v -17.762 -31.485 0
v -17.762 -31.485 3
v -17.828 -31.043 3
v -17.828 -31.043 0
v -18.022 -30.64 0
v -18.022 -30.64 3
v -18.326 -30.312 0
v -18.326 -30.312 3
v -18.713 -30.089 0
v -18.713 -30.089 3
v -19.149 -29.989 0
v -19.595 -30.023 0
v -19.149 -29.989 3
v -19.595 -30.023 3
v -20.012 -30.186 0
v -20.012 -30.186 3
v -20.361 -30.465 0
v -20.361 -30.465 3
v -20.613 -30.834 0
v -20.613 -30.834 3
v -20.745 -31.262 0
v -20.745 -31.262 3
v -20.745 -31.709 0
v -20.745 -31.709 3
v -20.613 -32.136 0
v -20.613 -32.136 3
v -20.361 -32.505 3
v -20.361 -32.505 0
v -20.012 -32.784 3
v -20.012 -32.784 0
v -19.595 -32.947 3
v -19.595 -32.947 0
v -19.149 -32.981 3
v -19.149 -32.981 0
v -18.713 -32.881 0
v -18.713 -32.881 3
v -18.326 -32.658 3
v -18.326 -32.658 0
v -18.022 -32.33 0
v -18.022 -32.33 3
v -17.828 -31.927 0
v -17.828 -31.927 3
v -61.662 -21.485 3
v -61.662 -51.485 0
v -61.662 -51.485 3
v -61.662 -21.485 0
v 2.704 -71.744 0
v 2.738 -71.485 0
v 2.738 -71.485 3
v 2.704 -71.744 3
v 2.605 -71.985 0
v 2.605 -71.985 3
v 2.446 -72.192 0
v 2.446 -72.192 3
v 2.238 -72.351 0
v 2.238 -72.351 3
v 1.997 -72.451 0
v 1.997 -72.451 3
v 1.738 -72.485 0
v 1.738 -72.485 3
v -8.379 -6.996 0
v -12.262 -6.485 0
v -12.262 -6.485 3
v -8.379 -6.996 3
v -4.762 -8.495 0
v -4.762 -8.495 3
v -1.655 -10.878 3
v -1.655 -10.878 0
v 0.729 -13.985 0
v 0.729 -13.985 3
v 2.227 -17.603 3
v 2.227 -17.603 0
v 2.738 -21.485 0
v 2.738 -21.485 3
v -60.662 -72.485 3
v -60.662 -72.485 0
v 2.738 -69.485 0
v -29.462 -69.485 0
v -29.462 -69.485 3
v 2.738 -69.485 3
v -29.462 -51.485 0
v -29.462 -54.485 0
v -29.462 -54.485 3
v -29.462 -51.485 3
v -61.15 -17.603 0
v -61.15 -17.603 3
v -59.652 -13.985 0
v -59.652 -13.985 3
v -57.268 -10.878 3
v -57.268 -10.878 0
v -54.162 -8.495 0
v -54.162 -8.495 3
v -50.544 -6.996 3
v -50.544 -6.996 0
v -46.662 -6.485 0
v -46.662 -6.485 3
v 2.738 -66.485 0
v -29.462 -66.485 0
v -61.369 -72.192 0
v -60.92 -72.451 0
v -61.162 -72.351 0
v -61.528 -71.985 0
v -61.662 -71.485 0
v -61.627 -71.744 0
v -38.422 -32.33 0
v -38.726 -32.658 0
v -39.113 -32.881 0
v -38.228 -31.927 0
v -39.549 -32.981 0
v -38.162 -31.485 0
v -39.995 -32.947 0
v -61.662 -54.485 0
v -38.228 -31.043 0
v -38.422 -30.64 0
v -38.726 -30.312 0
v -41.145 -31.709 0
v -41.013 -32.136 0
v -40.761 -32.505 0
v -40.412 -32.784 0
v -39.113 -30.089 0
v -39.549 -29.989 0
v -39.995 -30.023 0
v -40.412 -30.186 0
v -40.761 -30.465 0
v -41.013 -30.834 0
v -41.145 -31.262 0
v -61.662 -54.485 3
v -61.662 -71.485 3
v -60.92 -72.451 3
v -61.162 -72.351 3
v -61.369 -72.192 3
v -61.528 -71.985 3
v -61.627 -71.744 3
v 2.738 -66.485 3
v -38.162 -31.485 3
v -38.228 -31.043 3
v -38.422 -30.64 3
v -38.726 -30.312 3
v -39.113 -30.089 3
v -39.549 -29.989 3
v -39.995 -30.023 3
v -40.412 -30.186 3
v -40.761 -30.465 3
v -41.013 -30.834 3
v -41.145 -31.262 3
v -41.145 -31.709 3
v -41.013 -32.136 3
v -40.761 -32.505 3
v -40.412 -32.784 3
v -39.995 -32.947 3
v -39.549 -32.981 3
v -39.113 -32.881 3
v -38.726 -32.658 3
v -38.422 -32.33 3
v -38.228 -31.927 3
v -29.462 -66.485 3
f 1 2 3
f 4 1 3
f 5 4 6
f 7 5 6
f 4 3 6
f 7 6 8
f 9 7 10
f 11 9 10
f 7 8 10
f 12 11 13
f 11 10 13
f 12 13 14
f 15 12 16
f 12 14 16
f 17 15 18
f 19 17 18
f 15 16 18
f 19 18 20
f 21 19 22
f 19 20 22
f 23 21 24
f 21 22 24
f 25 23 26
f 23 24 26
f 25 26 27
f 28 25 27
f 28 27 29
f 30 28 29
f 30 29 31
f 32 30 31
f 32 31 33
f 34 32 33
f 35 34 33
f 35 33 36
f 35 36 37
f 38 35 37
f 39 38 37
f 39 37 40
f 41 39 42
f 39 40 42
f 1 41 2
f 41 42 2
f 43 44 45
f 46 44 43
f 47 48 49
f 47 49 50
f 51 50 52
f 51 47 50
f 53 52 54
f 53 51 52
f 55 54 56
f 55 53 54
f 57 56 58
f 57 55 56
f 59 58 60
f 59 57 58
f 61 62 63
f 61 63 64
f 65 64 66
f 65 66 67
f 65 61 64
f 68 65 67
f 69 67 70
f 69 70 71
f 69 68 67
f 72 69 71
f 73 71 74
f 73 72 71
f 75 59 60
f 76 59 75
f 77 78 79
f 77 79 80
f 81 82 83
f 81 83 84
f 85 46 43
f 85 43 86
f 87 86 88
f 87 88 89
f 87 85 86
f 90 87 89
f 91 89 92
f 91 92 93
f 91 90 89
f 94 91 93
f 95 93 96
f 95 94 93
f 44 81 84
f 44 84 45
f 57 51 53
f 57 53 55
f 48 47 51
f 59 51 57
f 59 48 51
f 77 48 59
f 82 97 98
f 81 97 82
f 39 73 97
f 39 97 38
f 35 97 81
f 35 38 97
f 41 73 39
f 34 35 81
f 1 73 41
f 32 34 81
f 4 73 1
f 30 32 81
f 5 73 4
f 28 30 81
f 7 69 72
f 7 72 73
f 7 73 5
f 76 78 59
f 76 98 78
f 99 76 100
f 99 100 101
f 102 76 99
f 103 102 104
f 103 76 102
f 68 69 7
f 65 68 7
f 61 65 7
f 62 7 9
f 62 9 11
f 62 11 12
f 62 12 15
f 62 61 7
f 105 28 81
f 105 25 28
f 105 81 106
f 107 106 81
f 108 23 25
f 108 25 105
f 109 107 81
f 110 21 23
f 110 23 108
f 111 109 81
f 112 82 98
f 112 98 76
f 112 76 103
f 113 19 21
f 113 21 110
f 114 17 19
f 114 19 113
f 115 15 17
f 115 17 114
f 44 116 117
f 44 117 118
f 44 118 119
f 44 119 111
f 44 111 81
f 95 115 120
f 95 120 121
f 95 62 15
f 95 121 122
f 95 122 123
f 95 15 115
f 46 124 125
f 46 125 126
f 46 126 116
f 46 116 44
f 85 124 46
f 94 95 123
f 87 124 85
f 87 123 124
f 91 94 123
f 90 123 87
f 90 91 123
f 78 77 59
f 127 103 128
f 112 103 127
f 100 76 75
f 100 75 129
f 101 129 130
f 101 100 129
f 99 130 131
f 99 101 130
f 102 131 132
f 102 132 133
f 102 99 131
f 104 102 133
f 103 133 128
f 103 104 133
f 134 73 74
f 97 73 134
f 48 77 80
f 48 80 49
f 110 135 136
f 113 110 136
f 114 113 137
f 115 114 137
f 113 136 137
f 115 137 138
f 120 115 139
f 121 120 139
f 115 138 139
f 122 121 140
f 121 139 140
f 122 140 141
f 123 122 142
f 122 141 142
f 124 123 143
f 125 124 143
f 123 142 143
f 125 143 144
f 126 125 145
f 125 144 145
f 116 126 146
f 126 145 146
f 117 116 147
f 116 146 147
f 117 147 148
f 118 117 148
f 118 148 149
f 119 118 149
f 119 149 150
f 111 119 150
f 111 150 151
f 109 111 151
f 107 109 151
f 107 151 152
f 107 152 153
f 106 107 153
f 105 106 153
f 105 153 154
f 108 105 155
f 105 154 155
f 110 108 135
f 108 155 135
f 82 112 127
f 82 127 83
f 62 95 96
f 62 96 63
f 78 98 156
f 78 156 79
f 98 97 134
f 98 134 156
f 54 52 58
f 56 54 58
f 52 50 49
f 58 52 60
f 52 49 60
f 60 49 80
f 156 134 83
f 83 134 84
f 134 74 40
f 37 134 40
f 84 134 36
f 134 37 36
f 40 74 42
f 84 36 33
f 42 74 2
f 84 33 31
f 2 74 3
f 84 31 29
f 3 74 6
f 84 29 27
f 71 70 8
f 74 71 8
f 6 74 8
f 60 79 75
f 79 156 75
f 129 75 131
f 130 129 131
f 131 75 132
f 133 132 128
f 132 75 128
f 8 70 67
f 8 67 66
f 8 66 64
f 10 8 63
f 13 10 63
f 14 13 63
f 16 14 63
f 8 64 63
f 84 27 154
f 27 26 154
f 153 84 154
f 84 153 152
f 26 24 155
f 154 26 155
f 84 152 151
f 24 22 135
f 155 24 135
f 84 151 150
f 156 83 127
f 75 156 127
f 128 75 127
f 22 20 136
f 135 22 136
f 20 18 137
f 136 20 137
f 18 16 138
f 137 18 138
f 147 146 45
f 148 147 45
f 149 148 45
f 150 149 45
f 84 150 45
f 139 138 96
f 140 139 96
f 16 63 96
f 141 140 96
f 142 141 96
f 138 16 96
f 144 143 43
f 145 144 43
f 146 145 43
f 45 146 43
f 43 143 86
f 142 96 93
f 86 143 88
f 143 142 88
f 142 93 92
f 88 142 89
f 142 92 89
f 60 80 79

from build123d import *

# Parameters (mm, degrees)
BOSS_EXTRUDE7_DEPTH = 3
SKETCH3_R           = 1.5
CUT_EXTRUDE1_DEPTH  = 3


with BuildPart() as part:
    # Sketch1 → Boss-Extrude7 (new body)
    with BuildSketch(Plane.XY):
        with BuildLine():
            Line((-12.261503554, -6.485084804), (-46.661503554, -6.485084804))
            ThreePointArc((-46.661503554, -6.485084804), (-57.268105272, -10.878483086), (-61.661503554, -21.485084804))
            Line((-61.661503554, -21.485084804), (-61.661503554, -51.485084804))
            Line((-61.661503554, -51.485084804), (-29.461503554, -51.485084804))
            Line((-29.461503554, -51.485084804), (-29.461503554, -54.485084804))
            Line((-29.461503554, -54.485084804), (-61.661503554, -54.485084804))
            Line((-61.661503554, -54.485084804), (-61.661503554, -71.485084804))
            ThreePointArc((-61.661503554, -71.485084804), (-61.368610335, -72.192191585), (-60.661503554, -72.485084804))
            Line((-60.661503554, -72.485084804), (1.738496446, -72.485084804))
            ThreePointArc((1.738496446, -72.485084804), (2.445603227, -72.192191585), (2.738496446, -71.485084804))
            Line((2.738496446, -71.485084804), (2.738496446, -69.485084804))
            Line((2.738496446, -69.485084804), (-29.461503554, -69.485084804))
            Line((-29.461503554, -69.485084804), (-29.461503554, -66.485084804))
            Line((-29.461503554, -66.485084804), (2.738496446, -66.485084804))
            Line((2.738496446, -66.485084804), (2.738496446, -21.485084804))
            ThreePointArc((2.738496446, -21.485084804), (-1.654901836, -10.878483086), (-12.261503554, -6.485084804))
        make_face()
    extrude(amount=BOSS_EXTRUDE7_DEPTH)

    # Sketch3 → Cut-Extrude1 (cut)
    with BuildSketch(Plane.XY.offset(3)):
        with Locations((-19.261503554, -31.485084804)):
            Circle(SKETCH3_R)
        with Locations((-39.661503554, -31.485084804)):
            Circle(SKETCH3_R)
    extrude(amount=-CUT_EXTRUDE1_DEPTH, mode=Mode.SUBTRACT)


solid = part.part
